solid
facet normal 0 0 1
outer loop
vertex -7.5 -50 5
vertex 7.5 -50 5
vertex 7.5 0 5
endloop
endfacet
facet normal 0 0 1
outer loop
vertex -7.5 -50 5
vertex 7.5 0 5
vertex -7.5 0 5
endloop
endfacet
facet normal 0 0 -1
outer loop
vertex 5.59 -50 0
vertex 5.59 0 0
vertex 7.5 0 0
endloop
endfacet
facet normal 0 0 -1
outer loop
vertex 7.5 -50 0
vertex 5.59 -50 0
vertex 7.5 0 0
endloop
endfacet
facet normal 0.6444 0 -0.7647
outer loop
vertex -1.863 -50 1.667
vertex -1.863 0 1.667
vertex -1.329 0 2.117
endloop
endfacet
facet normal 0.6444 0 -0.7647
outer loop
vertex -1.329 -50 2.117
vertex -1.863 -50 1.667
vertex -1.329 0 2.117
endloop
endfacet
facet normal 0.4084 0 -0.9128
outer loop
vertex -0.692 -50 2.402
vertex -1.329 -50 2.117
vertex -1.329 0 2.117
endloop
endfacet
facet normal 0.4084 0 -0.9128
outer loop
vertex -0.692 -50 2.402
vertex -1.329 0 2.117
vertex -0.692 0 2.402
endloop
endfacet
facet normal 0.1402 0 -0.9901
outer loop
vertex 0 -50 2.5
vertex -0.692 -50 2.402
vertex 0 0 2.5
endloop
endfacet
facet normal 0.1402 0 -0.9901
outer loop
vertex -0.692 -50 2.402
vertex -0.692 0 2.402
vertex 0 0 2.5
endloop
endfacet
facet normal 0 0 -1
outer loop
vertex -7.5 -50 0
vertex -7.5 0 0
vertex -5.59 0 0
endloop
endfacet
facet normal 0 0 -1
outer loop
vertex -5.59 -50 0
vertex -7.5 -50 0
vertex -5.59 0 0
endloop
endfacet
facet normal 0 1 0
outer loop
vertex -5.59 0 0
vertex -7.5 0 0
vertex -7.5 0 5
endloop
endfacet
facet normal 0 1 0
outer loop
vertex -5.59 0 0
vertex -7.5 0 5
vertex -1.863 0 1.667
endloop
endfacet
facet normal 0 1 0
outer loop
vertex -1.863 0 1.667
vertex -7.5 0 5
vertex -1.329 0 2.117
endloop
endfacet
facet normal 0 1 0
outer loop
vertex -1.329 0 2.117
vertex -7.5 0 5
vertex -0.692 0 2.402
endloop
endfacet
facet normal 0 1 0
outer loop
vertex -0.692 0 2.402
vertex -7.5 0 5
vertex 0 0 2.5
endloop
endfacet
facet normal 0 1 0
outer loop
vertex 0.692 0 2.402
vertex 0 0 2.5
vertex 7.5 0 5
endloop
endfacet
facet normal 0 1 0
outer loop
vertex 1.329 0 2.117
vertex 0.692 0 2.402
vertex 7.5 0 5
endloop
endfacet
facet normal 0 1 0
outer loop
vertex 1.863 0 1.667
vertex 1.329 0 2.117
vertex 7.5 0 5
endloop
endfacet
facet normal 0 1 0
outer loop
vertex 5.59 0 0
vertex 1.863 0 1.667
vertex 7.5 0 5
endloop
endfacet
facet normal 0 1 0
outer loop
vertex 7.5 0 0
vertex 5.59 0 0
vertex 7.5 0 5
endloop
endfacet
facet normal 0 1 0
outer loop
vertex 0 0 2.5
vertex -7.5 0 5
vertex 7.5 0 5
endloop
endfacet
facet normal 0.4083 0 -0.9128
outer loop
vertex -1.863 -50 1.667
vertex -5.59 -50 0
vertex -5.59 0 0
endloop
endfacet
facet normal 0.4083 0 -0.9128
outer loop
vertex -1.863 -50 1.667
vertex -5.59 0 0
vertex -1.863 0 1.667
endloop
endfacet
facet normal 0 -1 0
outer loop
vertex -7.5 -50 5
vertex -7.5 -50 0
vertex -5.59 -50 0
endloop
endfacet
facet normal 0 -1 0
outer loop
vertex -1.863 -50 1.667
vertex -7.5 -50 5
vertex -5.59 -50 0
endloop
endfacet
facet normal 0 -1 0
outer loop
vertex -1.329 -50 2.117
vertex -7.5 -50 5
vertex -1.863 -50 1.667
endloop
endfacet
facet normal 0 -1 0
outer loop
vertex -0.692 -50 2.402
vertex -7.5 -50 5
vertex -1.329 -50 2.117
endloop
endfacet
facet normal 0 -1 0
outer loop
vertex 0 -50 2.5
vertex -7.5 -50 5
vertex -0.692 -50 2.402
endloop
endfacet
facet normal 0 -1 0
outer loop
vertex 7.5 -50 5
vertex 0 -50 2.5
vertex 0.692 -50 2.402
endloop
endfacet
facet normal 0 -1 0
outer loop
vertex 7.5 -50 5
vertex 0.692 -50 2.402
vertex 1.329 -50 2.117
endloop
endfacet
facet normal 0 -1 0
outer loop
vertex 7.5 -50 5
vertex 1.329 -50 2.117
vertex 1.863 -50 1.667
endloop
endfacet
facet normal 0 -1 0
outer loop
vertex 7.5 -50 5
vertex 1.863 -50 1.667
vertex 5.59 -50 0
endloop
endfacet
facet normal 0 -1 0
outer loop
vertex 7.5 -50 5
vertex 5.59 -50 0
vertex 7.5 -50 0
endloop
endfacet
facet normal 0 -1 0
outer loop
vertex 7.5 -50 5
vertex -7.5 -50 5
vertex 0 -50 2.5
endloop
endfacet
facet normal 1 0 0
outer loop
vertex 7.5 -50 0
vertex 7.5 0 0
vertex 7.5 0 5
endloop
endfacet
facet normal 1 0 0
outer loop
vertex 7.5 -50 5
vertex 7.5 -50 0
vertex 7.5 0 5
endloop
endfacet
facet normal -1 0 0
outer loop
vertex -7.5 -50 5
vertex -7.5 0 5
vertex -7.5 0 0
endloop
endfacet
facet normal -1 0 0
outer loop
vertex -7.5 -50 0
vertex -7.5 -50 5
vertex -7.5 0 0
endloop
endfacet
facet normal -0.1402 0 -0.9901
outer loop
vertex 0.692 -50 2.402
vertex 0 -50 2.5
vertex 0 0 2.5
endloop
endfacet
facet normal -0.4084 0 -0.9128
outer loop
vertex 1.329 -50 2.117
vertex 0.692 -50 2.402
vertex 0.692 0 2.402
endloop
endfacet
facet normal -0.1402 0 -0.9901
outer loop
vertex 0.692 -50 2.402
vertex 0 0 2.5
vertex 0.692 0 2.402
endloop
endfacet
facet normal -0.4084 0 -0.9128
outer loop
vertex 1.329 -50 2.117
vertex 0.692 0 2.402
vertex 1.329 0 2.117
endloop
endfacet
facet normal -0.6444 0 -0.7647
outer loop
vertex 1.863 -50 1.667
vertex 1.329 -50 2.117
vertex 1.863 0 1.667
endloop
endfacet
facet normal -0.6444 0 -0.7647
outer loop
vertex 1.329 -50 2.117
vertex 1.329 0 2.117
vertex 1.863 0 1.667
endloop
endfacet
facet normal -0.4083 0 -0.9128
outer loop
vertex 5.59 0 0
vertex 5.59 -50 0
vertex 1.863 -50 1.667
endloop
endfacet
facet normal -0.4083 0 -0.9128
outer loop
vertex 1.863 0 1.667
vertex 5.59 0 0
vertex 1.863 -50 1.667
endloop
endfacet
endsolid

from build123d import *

# Parameters (mm, degrees)
F1_DEPTH    = 50
F2_T1_DEPTH = 66.3688124221


# Not quite as in the source:
# - a fillet or chamfer that OpenCascade refuses, or shapes differently, is made with other operations: its cross-section is extruded or revolved along the edge and cut away or added


with BuildPart() as f1:
    # F0 (on Front) → F1 (new body)
    with BuildSketch(Plane.XZ):
        with BuildLine():
            Line((7.5, 5), (0, 5))
            Line((0, 5), (-7.5, 5))
            Line((-7.5, 5), (-7.5, 0))
            Line((-7.5, 0), (-2.5, 0))
            ThreePointArc((-2.5, 0), (-1.767766953, 1.767766953), (0, 2.5))
            ThreePointArc((0, 2.5), (1.767766953, 1.767766953), (2.5, 0))
            Line((2.5, 0), (7.5, 0))
            Line((7.5, 0), (7.5, 5))
        make_face()
    extrude(amount=F1_DEPTH)

    # F2: chamfer of 5 on 2 edges, made by hand

    # F2_s2 → F2_t1 (cut)
    with BuildSketch(Plane.XZ.offset(-8.1844062111)):
        with BuildLine():
            Line((-5.5901699437, 0), (-1.8633899812, 1.6666666667))
            ThreePointArc((-1.8633899812, 1.6666666667), (-2.3064545677, 0.9645036688), (-2.5, 0))
            Line((-2.5, 0), (-5.5901699437, 0))
        make_face()
        with BuildLine():
            Line((5.5901699437, 0), (1.8633899812, 1.6666666667))
            ThreePointArc((1.8633899812, 1.6666666667), (2.3064545677, 0.9645036688), (2.5, 0))
            Line((2.5, 0), (5.5901699437, 0))
        make_face()
    extrude(amount=F2_T1_DEPTH, mode=Mode.SUBTRACT)


solid = f1.part
